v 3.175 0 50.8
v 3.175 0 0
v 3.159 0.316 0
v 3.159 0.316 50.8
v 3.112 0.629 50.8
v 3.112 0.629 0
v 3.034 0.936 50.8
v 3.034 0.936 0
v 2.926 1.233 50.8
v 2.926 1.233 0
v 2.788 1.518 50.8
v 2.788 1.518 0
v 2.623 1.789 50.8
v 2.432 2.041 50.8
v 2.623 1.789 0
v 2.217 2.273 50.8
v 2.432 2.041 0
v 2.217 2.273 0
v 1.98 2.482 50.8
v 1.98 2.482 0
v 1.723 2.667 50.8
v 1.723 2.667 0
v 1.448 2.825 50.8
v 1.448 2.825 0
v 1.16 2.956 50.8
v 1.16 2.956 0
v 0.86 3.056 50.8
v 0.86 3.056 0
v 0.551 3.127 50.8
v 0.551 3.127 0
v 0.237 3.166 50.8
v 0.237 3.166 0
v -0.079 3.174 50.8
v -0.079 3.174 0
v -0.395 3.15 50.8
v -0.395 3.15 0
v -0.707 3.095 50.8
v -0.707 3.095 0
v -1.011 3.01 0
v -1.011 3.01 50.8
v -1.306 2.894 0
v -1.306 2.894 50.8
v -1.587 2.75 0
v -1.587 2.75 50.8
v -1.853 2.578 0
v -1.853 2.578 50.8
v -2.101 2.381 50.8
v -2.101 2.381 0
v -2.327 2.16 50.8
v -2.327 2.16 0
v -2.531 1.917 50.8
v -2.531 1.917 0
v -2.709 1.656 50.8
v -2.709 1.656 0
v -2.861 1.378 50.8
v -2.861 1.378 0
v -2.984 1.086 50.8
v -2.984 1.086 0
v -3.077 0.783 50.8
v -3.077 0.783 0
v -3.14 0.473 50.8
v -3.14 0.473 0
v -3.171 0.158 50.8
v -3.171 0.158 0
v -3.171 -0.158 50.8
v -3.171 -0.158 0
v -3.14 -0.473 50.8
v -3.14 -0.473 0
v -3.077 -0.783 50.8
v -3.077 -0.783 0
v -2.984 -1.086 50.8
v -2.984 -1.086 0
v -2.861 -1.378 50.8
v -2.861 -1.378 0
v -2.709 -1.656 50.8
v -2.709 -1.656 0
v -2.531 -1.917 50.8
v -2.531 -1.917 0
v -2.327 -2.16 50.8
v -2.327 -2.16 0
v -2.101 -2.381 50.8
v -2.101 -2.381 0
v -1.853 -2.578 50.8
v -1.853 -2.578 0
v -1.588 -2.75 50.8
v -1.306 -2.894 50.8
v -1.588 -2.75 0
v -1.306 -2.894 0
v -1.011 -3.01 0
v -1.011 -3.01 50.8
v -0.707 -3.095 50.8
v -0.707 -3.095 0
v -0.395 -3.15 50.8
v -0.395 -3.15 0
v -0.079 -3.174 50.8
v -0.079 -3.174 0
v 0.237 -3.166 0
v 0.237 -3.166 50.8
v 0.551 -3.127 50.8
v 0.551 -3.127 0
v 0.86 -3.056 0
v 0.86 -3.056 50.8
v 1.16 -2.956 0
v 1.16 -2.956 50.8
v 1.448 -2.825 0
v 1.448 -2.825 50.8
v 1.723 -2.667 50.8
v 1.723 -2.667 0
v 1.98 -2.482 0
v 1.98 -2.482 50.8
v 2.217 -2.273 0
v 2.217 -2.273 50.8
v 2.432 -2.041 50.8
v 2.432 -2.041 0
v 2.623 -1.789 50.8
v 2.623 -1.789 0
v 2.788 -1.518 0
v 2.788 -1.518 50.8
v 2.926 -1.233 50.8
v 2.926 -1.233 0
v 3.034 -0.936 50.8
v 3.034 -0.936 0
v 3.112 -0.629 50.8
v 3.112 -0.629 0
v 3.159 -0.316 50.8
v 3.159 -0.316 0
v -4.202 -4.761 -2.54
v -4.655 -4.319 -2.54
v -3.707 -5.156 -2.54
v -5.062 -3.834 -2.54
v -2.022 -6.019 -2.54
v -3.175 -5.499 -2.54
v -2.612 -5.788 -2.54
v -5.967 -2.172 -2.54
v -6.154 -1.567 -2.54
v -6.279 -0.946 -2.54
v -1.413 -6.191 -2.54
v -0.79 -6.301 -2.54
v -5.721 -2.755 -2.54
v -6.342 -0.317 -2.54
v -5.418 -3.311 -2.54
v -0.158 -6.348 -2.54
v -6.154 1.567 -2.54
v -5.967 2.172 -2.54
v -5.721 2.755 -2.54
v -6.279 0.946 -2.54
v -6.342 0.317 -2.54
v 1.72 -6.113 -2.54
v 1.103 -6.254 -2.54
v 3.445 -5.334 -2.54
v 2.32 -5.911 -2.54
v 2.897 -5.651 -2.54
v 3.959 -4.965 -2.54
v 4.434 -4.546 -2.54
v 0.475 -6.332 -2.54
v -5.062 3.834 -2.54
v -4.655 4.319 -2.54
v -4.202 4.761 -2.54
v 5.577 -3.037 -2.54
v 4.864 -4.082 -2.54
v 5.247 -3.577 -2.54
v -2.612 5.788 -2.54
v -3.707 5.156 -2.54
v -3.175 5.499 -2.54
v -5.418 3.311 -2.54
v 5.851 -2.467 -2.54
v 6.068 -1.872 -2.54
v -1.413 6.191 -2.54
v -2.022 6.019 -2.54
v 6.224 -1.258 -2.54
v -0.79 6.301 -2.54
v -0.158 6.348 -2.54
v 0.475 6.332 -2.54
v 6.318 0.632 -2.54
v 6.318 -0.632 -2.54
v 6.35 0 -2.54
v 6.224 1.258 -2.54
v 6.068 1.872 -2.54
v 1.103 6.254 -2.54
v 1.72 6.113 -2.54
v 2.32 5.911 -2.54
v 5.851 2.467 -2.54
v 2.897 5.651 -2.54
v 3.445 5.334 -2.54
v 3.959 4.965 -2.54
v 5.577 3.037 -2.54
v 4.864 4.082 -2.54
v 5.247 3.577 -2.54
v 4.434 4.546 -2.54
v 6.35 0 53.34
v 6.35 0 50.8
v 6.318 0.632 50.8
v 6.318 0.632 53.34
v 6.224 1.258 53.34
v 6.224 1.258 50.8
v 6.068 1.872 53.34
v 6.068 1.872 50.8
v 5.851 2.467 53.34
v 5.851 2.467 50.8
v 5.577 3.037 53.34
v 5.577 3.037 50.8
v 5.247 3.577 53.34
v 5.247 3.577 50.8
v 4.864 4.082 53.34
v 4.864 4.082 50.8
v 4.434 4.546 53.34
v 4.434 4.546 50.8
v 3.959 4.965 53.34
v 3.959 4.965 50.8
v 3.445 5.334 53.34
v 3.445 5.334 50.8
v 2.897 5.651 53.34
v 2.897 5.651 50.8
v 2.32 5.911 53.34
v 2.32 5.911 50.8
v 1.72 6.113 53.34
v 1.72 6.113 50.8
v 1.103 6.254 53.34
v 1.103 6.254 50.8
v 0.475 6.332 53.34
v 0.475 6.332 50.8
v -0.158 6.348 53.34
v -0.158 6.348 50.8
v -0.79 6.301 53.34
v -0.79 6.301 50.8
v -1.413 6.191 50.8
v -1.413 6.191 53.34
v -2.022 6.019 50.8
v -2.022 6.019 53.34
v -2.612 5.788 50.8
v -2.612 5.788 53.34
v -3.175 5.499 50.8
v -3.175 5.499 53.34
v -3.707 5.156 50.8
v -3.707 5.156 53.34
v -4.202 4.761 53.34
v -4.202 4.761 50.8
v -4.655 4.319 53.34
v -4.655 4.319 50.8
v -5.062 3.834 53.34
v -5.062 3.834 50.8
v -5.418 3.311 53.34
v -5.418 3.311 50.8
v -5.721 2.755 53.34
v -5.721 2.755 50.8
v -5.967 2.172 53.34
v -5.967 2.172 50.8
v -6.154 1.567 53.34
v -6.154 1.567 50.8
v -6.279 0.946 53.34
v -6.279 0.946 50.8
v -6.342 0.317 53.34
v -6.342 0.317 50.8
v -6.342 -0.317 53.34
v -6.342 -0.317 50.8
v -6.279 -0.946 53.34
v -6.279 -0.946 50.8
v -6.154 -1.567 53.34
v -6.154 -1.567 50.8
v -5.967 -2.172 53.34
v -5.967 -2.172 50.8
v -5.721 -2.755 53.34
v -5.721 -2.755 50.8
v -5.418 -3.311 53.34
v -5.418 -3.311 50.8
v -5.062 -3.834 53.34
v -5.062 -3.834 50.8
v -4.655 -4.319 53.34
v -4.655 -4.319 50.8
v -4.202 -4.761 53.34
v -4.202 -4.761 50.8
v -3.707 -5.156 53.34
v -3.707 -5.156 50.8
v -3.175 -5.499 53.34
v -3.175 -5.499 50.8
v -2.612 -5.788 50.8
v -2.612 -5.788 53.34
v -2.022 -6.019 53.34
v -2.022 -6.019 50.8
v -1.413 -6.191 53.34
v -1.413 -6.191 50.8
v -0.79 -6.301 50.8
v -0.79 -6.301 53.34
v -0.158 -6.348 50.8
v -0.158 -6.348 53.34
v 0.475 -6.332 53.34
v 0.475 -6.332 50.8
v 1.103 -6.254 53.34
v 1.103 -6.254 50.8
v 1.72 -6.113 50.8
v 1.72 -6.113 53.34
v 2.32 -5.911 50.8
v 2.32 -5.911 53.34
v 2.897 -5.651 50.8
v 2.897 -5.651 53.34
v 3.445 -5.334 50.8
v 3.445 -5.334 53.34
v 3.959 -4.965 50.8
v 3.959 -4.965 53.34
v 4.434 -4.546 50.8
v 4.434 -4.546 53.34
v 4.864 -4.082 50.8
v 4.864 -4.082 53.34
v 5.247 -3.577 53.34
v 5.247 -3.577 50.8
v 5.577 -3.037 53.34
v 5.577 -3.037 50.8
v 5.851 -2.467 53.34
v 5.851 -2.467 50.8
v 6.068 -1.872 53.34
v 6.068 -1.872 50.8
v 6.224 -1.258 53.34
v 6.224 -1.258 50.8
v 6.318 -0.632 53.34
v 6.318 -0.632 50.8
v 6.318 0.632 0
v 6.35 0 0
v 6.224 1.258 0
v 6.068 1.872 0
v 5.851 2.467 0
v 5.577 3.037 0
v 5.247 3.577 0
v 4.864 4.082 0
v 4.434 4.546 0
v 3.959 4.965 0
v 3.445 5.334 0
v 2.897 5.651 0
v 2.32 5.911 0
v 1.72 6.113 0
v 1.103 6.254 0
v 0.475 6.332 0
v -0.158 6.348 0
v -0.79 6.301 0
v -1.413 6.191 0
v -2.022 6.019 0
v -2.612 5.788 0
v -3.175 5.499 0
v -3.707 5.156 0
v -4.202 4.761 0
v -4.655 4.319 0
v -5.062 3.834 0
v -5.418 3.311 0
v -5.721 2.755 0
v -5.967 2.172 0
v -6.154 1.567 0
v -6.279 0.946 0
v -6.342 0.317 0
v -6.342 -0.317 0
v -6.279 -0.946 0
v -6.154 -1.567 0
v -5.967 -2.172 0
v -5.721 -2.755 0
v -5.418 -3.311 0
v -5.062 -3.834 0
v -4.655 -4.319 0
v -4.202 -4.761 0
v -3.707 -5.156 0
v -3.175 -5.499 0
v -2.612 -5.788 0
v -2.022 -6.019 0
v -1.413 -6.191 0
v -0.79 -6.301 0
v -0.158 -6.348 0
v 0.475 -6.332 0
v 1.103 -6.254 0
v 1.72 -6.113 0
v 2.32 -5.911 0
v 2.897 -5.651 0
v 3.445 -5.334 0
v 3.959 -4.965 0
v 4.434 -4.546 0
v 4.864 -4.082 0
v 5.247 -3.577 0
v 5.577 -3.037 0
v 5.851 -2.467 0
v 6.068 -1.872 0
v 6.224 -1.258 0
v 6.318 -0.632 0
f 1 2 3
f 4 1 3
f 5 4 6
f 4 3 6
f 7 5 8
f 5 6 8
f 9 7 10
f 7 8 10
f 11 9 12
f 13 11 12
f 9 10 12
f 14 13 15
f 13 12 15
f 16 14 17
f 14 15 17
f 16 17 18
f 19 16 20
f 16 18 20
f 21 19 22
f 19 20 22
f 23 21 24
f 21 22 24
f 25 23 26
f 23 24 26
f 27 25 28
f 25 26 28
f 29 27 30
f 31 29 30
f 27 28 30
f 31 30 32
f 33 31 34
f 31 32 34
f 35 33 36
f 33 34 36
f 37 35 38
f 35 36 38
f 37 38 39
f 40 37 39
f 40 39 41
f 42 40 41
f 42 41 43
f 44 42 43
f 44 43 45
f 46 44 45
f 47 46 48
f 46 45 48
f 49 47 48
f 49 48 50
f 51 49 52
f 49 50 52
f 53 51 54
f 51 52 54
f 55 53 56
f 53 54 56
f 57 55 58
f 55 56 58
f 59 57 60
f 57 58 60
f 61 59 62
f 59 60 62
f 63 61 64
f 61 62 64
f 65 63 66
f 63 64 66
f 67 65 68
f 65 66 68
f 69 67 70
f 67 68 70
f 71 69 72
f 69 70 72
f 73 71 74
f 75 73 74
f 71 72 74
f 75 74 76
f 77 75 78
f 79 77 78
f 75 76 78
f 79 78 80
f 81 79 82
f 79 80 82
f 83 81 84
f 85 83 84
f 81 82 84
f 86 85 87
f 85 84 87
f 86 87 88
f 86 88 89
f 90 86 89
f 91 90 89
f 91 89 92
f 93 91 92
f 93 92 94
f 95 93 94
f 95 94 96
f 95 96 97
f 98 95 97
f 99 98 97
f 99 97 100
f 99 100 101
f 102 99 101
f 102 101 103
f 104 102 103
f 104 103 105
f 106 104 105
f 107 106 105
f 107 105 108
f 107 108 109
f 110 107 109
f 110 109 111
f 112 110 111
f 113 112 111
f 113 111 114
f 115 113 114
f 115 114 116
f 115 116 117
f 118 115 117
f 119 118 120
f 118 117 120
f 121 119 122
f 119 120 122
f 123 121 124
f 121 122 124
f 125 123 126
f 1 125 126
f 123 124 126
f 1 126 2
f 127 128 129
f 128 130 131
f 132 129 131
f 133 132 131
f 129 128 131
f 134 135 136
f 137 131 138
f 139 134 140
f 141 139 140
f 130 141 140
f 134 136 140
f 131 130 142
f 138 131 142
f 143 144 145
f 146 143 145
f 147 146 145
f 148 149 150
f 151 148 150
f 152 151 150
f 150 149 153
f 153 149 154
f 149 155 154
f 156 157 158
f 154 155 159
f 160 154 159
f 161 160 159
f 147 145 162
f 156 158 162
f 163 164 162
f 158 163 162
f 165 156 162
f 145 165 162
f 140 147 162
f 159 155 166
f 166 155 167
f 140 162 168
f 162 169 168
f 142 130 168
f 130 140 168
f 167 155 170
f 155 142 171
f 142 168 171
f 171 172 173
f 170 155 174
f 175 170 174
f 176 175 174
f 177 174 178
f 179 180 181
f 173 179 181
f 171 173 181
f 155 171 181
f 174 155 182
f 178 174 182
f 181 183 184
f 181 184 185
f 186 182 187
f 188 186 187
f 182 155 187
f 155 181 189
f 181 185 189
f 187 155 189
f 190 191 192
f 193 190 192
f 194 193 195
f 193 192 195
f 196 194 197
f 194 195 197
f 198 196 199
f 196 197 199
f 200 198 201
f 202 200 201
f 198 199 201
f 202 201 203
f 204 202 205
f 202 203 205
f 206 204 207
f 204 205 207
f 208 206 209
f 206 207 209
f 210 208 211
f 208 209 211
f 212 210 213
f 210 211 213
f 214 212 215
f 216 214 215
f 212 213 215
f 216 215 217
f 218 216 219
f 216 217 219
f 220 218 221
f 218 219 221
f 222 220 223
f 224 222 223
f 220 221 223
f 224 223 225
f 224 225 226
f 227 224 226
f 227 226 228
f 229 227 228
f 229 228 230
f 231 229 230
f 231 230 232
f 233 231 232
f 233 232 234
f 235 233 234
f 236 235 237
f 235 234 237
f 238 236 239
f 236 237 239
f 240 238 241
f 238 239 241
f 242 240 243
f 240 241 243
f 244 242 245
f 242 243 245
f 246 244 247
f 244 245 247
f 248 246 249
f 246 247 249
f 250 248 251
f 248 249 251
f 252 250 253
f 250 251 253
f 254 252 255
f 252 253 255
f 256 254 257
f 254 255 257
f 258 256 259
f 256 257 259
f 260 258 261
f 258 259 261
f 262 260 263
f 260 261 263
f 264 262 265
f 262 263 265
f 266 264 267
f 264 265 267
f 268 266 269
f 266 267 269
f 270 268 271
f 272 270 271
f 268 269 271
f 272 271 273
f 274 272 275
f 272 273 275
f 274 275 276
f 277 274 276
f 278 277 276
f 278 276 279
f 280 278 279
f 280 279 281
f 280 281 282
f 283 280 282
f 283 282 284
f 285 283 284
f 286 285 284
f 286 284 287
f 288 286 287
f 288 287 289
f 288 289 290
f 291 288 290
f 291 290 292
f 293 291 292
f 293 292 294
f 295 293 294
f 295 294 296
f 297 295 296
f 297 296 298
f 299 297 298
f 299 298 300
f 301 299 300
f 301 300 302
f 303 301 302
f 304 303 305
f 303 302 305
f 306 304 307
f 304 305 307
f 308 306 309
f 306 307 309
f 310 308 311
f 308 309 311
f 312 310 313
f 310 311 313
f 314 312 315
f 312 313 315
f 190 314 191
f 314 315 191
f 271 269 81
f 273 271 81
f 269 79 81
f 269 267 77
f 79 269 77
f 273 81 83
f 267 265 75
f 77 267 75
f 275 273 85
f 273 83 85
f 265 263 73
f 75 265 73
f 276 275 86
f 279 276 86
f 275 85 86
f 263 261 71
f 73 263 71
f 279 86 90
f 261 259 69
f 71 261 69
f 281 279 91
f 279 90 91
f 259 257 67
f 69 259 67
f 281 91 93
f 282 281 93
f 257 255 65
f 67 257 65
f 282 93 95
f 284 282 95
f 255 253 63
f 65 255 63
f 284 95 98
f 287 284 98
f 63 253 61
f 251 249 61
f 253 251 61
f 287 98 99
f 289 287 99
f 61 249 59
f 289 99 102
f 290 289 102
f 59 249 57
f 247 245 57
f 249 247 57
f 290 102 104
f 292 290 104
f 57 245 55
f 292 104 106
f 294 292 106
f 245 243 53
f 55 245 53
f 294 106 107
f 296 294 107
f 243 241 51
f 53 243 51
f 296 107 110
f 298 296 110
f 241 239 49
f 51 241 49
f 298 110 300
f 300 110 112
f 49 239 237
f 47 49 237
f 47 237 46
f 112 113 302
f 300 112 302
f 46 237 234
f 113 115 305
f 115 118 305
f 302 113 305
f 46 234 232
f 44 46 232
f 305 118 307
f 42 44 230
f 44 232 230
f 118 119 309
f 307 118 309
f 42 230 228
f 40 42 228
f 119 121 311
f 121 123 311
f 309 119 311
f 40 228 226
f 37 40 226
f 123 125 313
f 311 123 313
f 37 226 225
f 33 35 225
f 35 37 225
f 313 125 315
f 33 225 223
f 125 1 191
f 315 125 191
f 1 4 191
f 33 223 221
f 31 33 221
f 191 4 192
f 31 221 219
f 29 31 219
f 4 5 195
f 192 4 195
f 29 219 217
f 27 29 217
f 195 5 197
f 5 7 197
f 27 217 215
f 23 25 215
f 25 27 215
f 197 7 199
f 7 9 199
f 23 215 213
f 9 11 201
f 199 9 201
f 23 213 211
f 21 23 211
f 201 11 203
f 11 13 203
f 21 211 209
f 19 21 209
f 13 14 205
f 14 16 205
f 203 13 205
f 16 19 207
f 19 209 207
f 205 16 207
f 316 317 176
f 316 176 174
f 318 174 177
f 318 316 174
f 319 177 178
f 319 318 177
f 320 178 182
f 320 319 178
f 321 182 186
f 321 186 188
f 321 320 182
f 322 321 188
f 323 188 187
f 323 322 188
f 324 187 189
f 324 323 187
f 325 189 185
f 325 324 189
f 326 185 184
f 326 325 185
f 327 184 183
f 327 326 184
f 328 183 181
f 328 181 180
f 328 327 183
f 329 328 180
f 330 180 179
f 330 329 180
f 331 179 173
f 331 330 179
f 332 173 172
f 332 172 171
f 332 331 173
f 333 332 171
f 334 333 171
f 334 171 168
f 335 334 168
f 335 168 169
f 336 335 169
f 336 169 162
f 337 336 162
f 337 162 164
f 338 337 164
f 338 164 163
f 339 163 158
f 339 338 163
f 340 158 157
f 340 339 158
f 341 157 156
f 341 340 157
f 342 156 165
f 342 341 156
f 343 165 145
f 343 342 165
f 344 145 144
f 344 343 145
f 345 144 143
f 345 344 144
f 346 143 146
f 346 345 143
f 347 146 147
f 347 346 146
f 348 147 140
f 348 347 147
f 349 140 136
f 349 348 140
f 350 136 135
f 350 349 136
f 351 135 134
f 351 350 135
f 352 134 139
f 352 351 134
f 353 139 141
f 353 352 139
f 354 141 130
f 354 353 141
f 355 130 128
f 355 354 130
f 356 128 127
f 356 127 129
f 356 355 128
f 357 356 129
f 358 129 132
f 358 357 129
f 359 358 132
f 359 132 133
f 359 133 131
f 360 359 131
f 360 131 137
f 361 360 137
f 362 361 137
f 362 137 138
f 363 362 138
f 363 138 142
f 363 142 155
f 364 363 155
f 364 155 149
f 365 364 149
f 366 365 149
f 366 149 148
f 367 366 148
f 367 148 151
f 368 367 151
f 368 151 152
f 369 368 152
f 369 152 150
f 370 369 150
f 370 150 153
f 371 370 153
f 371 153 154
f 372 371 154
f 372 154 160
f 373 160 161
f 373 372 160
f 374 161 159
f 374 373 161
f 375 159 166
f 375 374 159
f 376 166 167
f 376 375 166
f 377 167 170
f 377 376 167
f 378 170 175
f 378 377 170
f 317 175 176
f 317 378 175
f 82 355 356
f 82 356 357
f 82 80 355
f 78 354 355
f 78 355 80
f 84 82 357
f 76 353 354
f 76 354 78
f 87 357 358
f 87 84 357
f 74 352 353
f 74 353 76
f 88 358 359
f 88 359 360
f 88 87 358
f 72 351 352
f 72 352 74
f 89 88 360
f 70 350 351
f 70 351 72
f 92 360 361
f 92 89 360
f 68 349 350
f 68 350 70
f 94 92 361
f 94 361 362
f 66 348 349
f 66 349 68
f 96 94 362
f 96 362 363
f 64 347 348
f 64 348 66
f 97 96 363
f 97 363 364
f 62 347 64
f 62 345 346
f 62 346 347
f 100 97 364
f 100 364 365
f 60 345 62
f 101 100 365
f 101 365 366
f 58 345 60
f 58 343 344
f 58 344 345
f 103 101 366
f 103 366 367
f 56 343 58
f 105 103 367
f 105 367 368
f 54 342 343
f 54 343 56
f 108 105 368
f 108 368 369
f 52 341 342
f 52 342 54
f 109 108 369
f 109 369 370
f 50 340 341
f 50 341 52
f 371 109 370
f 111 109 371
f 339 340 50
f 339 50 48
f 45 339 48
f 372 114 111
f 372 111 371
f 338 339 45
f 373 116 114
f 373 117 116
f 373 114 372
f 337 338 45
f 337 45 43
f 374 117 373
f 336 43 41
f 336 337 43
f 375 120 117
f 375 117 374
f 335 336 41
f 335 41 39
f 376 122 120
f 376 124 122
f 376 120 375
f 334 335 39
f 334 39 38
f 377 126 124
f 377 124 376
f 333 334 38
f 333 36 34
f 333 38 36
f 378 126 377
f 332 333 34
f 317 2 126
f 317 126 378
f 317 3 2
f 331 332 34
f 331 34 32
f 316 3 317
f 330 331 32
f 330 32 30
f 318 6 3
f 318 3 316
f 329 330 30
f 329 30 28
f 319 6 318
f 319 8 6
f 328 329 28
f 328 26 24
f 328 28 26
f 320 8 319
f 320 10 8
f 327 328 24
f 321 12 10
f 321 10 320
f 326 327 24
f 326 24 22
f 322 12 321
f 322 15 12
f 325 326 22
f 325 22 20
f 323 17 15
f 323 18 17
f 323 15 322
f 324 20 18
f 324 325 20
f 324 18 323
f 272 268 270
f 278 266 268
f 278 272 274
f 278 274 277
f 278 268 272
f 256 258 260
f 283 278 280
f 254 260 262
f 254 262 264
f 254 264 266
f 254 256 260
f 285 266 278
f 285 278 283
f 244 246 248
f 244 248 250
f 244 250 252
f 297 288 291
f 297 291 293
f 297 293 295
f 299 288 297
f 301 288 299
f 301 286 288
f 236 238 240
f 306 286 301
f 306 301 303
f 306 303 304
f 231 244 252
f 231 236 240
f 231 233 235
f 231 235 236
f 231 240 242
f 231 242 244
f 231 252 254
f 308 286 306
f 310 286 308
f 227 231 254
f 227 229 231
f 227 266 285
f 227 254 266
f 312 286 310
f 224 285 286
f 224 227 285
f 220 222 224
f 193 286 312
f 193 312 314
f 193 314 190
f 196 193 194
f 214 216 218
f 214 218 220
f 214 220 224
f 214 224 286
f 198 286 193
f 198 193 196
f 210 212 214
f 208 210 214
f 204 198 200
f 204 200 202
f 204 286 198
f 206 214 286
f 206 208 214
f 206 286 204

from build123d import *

# Parameters (mm, degrees)
SKETCH1_R           = 3.175
BOSS_EXTRUDE1_DEPTH = 50.8
SKETCH3_R           = 6.35
BOSS_EXTRUDE2_DEPTH = 2.54


with BuildPart() as part:
    # Sketch1 → Boss-Extrude1 (new body)
    with BuildSketch(Plane.XY):
        Circle(SKETCH1_R)
    extrude(amount=BOSS_EXTRUDE1_DEPTH)

    # Sketch3 → Boss-Extrude2 (add)
    with BuildSketch(Plane.XY.offset(50.8)):
        Circle(SKETCH3_R)
    boss_extrude2 = extrude(amount=BOSS_EXTRUDE2_DEPTH)

    # Mirror1: Boss-Extrude2 across plane
    add(boss_extrude2.mirror(Plane.XY.offset(25.4)))


solid = part.part
